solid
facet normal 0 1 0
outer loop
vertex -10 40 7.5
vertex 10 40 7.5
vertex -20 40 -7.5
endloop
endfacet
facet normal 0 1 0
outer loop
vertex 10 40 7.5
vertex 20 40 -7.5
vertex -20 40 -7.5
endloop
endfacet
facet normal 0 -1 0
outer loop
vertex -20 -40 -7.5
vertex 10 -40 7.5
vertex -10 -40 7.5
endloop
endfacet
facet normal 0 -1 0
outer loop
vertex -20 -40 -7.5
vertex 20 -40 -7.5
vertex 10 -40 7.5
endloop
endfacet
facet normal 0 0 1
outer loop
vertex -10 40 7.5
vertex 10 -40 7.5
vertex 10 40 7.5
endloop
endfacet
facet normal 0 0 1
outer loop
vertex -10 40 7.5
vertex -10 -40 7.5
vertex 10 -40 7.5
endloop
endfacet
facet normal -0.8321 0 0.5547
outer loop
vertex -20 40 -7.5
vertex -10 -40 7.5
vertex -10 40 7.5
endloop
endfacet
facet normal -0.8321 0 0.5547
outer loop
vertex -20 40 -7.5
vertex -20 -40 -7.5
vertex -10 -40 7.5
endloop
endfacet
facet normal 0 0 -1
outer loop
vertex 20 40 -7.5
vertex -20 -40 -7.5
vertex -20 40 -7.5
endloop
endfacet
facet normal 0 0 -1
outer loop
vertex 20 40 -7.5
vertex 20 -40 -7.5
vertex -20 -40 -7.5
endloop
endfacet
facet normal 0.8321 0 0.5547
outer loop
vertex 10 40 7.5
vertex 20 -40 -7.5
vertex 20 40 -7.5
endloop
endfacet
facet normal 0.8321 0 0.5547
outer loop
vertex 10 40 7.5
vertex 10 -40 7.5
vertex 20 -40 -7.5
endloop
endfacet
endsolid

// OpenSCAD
B=40;
b=20;
h=15;

rotate([90,0,0])
linear_extrude(height=80, center=true)
polygon(points = [
            [-B/2,-h/2],
            [-b/2,h/2],
            [b/2,h/2],
            [B/2,-h/2]]);
